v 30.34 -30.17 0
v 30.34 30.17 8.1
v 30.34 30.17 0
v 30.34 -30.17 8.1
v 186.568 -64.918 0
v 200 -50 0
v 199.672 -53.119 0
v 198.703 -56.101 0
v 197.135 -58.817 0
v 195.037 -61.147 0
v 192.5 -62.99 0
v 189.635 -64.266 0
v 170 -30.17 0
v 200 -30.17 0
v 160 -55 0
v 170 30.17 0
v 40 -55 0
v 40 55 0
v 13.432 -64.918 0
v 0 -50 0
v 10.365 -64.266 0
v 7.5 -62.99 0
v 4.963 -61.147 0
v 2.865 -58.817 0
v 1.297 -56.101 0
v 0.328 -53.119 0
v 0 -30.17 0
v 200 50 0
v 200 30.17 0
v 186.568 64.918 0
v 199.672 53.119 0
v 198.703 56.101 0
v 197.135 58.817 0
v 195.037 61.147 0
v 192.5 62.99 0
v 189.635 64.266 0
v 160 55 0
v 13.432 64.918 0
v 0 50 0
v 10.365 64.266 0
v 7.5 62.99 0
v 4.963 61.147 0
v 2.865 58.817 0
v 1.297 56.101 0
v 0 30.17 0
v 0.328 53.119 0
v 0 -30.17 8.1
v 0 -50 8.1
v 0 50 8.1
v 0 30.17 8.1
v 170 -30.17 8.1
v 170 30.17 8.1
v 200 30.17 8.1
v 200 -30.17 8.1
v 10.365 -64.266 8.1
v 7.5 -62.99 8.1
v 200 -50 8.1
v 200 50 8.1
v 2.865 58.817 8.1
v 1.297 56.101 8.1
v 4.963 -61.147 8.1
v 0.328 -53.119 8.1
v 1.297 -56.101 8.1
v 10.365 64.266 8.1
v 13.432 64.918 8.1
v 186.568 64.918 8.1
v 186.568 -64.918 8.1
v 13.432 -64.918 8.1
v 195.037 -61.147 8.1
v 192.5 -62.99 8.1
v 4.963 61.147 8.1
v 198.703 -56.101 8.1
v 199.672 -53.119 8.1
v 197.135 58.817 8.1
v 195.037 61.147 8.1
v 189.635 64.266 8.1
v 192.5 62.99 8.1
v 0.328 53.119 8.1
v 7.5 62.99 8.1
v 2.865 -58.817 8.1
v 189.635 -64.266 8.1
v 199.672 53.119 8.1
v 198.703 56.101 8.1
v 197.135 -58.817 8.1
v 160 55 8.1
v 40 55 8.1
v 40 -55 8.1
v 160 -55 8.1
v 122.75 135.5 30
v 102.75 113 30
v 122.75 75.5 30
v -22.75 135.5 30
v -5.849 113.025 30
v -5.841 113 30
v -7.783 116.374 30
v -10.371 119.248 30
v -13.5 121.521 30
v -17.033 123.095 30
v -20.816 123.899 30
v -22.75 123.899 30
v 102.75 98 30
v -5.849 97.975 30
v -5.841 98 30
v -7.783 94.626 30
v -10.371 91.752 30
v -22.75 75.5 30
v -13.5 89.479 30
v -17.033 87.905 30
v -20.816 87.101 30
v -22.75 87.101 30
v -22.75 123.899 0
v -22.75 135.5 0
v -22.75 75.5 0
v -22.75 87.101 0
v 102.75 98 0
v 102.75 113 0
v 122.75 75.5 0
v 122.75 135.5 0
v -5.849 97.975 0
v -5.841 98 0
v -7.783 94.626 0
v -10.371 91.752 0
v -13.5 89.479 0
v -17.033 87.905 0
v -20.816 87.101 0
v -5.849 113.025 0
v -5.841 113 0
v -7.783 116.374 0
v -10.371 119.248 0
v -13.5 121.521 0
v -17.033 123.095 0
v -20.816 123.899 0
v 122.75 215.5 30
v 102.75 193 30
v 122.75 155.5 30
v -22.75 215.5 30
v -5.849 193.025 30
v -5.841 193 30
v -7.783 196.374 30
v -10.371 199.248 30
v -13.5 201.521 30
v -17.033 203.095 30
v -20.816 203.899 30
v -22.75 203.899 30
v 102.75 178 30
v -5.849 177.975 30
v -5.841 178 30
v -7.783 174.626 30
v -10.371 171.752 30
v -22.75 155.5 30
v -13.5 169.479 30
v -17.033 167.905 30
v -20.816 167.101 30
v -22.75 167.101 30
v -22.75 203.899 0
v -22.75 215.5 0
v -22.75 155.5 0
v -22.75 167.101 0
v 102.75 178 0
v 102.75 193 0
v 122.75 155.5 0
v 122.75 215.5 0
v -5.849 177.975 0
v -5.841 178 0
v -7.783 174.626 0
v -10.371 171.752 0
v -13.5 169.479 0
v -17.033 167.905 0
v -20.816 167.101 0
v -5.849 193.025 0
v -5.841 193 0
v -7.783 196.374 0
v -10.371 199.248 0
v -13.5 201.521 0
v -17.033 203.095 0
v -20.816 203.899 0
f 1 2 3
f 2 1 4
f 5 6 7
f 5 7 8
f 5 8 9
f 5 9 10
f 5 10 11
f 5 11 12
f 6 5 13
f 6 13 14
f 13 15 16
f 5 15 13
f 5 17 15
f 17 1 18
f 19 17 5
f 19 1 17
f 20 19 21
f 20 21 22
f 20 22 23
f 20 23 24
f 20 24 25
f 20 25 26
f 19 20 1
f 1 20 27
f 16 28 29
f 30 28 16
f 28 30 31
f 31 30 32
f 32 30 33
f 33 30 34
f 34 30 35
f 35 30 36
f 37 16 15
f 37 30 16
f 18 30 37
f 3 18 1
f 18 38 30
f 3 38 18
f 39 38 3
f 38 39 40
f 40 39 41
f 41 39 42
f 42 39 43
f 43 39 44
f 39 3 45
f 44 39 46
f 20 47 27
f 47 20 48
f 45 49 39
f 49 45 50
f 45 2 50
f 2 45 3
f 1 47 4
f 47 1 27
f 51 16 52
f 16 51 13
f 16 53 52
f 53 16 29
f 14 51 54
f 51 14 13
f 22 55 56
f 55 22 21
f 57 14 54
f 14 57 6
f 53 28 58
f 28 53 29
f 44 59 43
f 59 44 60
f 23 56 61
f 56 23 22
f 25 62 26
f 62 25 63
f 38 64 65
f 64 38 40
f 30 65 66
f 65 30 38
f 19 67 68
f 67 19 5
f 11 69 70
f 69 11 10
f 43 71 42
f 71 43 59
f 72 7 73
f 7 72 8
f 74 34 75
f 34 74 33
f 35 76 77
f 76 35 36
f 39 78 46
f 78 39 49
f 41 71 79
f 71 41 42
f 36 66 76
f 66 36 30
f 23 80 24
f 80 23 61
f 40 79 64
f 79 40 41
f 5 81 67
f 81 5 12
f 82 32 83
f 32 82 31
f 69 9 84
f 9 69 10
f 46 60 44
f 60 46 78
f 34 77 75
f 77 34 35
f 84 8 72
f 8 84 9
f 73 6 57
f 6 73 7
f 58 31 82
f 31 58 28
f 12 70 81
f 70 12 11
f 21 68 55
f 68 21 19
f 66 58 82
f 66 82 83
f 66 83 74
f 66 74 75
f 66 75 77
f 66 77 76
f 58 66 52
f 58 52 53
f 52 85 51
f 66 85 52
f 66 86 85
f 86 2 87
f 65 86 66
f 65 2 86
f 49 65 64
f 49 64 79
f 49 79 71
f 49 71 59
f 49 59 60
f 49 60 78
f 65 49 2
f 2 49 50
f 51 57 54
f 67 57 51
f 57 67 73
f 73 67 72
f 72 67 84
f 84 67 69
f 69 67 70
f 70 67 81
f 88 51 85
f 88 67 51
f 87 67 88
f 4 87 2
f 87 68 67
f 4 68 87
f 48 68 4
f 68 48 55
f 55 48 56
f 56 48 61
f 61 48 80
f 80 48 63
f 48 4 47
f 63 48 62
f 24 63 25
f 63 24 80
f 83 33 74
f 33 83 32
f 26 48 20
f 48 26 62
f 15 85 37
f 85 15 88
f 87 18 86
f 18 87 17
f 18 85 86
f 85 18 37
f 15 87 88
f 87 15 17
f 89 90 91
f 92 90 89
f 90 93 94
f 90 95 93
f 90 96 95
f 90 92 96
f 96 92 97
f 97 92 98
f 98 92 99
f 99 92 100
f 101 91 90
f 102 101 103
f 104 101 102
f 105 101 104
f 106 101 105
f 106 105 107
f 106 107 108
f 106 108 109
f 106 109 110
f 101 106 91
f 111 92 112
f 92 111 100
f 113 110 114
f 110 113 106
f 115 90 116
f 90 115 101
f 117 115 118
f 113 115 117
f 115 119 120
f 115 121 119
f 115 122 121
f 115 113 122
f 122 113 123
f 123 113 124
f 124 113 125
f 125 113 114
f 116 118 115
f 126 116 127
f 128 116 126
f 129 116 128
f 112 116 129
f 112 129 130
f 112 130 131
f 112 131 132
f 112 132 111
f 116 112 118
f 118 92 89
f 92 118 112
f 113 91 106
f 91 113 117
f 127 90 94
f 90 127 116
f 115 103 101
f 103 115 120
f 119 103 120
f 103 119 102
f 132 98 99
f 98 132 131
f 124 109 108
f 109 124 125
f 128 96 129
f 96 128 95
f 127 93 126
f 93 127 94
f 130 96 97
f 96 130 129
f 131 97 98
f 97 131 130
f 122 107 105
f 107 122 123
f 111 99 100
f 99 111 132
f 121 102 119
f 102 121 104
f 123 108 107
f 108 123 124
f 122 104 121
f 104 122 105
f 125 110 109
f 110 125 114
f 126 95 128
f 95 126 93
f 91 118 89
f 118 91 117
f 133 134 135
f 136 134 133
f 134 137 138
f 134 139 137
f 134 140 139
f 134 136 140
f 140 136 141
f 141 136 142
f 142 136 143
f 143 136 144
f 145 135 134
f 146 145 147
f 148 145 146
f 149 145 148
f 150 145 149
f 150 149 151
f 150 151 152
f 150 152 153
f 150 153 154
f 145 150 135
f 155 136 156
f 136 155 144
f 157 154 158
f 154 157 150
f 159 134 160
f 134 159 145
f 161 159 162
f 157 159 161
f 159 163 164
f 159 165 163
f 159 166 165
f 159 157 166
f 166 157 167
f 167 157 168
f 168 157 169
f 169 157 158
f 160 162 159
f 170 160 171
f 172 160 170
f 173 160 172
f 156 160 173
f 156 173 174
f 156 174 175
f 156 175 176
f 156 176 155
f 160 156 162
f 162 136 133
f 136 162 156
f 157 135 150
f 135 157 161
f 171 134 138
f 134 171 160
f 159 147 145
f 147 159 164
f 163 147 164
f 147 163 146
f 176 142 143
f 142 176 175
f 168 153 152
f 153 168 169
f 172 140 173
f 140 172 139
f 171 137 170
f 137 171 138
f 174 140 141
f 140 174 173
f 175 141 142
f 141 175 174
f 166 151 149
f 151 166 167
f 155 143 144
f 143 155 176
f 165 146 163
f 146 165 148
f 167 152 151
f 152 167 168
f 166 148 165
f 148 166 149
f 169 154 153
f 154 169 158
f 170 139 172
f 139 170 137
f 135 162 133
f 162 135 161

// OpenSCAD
D = 37;
L = 200; //250;
L2 = 150;
W = 60;
H0 = 107;
H = H0 + D/2;
PX = 30;
W0 = 15;
H1 = 15;

PH = H + D/2;

EPSILON = 0.01;



L = 60;
BH = 20;
module body(just_base=false) {
	if (!just_base)
	translate([0, 0, BH])
	difference() {
		translate([0, -W/2, 0])
		cube([L/2, W, H]);

		translate([-L/2, -W0/2, -EPSILON])
		cube([L*2, W0, H]);

		translate([-L/2, 0, H0+D/2])
		rotate([0, 90, 0])
		cylinder(d=D, h=L*2);
	}

	delta = just_base ? 0.17 : 0;
	translate([0, -L/2 -delta, 0])
	cube([L/2+delta*2, L+delta*2, BH]);
}

LL = 200;
MA = 10;
WW = 100;
DD = 30;
HH = 8;

module pillars(just_base=false) {
	translate([0, 0, 0])
	body(just_base);

	translate([LL-L/2, 0, 0])
	body(just_base);
}

module base() {
	difference() {
		minkowski() {
			translate([DD/2, -WW/2, 0])
			cube([LL-DD, WW, HH]);
			cylinder(d=DD, h=.1);
		}
		pillars(true);

		d = 20;
		dd = WW+DD-d;
		ww = LL-W-d;
		translate([(LL-ww)/2, -dd/2, 0])
		cube([ww, dd, HH*2]);
	}
}


base();
//pillars();

translate([W+H/2, H-20, 0])
rotate([0, 270, 0])
body(false);

translate([W+H/2, H+W, 0])
rotate([0, 270, 0])
body(false);
